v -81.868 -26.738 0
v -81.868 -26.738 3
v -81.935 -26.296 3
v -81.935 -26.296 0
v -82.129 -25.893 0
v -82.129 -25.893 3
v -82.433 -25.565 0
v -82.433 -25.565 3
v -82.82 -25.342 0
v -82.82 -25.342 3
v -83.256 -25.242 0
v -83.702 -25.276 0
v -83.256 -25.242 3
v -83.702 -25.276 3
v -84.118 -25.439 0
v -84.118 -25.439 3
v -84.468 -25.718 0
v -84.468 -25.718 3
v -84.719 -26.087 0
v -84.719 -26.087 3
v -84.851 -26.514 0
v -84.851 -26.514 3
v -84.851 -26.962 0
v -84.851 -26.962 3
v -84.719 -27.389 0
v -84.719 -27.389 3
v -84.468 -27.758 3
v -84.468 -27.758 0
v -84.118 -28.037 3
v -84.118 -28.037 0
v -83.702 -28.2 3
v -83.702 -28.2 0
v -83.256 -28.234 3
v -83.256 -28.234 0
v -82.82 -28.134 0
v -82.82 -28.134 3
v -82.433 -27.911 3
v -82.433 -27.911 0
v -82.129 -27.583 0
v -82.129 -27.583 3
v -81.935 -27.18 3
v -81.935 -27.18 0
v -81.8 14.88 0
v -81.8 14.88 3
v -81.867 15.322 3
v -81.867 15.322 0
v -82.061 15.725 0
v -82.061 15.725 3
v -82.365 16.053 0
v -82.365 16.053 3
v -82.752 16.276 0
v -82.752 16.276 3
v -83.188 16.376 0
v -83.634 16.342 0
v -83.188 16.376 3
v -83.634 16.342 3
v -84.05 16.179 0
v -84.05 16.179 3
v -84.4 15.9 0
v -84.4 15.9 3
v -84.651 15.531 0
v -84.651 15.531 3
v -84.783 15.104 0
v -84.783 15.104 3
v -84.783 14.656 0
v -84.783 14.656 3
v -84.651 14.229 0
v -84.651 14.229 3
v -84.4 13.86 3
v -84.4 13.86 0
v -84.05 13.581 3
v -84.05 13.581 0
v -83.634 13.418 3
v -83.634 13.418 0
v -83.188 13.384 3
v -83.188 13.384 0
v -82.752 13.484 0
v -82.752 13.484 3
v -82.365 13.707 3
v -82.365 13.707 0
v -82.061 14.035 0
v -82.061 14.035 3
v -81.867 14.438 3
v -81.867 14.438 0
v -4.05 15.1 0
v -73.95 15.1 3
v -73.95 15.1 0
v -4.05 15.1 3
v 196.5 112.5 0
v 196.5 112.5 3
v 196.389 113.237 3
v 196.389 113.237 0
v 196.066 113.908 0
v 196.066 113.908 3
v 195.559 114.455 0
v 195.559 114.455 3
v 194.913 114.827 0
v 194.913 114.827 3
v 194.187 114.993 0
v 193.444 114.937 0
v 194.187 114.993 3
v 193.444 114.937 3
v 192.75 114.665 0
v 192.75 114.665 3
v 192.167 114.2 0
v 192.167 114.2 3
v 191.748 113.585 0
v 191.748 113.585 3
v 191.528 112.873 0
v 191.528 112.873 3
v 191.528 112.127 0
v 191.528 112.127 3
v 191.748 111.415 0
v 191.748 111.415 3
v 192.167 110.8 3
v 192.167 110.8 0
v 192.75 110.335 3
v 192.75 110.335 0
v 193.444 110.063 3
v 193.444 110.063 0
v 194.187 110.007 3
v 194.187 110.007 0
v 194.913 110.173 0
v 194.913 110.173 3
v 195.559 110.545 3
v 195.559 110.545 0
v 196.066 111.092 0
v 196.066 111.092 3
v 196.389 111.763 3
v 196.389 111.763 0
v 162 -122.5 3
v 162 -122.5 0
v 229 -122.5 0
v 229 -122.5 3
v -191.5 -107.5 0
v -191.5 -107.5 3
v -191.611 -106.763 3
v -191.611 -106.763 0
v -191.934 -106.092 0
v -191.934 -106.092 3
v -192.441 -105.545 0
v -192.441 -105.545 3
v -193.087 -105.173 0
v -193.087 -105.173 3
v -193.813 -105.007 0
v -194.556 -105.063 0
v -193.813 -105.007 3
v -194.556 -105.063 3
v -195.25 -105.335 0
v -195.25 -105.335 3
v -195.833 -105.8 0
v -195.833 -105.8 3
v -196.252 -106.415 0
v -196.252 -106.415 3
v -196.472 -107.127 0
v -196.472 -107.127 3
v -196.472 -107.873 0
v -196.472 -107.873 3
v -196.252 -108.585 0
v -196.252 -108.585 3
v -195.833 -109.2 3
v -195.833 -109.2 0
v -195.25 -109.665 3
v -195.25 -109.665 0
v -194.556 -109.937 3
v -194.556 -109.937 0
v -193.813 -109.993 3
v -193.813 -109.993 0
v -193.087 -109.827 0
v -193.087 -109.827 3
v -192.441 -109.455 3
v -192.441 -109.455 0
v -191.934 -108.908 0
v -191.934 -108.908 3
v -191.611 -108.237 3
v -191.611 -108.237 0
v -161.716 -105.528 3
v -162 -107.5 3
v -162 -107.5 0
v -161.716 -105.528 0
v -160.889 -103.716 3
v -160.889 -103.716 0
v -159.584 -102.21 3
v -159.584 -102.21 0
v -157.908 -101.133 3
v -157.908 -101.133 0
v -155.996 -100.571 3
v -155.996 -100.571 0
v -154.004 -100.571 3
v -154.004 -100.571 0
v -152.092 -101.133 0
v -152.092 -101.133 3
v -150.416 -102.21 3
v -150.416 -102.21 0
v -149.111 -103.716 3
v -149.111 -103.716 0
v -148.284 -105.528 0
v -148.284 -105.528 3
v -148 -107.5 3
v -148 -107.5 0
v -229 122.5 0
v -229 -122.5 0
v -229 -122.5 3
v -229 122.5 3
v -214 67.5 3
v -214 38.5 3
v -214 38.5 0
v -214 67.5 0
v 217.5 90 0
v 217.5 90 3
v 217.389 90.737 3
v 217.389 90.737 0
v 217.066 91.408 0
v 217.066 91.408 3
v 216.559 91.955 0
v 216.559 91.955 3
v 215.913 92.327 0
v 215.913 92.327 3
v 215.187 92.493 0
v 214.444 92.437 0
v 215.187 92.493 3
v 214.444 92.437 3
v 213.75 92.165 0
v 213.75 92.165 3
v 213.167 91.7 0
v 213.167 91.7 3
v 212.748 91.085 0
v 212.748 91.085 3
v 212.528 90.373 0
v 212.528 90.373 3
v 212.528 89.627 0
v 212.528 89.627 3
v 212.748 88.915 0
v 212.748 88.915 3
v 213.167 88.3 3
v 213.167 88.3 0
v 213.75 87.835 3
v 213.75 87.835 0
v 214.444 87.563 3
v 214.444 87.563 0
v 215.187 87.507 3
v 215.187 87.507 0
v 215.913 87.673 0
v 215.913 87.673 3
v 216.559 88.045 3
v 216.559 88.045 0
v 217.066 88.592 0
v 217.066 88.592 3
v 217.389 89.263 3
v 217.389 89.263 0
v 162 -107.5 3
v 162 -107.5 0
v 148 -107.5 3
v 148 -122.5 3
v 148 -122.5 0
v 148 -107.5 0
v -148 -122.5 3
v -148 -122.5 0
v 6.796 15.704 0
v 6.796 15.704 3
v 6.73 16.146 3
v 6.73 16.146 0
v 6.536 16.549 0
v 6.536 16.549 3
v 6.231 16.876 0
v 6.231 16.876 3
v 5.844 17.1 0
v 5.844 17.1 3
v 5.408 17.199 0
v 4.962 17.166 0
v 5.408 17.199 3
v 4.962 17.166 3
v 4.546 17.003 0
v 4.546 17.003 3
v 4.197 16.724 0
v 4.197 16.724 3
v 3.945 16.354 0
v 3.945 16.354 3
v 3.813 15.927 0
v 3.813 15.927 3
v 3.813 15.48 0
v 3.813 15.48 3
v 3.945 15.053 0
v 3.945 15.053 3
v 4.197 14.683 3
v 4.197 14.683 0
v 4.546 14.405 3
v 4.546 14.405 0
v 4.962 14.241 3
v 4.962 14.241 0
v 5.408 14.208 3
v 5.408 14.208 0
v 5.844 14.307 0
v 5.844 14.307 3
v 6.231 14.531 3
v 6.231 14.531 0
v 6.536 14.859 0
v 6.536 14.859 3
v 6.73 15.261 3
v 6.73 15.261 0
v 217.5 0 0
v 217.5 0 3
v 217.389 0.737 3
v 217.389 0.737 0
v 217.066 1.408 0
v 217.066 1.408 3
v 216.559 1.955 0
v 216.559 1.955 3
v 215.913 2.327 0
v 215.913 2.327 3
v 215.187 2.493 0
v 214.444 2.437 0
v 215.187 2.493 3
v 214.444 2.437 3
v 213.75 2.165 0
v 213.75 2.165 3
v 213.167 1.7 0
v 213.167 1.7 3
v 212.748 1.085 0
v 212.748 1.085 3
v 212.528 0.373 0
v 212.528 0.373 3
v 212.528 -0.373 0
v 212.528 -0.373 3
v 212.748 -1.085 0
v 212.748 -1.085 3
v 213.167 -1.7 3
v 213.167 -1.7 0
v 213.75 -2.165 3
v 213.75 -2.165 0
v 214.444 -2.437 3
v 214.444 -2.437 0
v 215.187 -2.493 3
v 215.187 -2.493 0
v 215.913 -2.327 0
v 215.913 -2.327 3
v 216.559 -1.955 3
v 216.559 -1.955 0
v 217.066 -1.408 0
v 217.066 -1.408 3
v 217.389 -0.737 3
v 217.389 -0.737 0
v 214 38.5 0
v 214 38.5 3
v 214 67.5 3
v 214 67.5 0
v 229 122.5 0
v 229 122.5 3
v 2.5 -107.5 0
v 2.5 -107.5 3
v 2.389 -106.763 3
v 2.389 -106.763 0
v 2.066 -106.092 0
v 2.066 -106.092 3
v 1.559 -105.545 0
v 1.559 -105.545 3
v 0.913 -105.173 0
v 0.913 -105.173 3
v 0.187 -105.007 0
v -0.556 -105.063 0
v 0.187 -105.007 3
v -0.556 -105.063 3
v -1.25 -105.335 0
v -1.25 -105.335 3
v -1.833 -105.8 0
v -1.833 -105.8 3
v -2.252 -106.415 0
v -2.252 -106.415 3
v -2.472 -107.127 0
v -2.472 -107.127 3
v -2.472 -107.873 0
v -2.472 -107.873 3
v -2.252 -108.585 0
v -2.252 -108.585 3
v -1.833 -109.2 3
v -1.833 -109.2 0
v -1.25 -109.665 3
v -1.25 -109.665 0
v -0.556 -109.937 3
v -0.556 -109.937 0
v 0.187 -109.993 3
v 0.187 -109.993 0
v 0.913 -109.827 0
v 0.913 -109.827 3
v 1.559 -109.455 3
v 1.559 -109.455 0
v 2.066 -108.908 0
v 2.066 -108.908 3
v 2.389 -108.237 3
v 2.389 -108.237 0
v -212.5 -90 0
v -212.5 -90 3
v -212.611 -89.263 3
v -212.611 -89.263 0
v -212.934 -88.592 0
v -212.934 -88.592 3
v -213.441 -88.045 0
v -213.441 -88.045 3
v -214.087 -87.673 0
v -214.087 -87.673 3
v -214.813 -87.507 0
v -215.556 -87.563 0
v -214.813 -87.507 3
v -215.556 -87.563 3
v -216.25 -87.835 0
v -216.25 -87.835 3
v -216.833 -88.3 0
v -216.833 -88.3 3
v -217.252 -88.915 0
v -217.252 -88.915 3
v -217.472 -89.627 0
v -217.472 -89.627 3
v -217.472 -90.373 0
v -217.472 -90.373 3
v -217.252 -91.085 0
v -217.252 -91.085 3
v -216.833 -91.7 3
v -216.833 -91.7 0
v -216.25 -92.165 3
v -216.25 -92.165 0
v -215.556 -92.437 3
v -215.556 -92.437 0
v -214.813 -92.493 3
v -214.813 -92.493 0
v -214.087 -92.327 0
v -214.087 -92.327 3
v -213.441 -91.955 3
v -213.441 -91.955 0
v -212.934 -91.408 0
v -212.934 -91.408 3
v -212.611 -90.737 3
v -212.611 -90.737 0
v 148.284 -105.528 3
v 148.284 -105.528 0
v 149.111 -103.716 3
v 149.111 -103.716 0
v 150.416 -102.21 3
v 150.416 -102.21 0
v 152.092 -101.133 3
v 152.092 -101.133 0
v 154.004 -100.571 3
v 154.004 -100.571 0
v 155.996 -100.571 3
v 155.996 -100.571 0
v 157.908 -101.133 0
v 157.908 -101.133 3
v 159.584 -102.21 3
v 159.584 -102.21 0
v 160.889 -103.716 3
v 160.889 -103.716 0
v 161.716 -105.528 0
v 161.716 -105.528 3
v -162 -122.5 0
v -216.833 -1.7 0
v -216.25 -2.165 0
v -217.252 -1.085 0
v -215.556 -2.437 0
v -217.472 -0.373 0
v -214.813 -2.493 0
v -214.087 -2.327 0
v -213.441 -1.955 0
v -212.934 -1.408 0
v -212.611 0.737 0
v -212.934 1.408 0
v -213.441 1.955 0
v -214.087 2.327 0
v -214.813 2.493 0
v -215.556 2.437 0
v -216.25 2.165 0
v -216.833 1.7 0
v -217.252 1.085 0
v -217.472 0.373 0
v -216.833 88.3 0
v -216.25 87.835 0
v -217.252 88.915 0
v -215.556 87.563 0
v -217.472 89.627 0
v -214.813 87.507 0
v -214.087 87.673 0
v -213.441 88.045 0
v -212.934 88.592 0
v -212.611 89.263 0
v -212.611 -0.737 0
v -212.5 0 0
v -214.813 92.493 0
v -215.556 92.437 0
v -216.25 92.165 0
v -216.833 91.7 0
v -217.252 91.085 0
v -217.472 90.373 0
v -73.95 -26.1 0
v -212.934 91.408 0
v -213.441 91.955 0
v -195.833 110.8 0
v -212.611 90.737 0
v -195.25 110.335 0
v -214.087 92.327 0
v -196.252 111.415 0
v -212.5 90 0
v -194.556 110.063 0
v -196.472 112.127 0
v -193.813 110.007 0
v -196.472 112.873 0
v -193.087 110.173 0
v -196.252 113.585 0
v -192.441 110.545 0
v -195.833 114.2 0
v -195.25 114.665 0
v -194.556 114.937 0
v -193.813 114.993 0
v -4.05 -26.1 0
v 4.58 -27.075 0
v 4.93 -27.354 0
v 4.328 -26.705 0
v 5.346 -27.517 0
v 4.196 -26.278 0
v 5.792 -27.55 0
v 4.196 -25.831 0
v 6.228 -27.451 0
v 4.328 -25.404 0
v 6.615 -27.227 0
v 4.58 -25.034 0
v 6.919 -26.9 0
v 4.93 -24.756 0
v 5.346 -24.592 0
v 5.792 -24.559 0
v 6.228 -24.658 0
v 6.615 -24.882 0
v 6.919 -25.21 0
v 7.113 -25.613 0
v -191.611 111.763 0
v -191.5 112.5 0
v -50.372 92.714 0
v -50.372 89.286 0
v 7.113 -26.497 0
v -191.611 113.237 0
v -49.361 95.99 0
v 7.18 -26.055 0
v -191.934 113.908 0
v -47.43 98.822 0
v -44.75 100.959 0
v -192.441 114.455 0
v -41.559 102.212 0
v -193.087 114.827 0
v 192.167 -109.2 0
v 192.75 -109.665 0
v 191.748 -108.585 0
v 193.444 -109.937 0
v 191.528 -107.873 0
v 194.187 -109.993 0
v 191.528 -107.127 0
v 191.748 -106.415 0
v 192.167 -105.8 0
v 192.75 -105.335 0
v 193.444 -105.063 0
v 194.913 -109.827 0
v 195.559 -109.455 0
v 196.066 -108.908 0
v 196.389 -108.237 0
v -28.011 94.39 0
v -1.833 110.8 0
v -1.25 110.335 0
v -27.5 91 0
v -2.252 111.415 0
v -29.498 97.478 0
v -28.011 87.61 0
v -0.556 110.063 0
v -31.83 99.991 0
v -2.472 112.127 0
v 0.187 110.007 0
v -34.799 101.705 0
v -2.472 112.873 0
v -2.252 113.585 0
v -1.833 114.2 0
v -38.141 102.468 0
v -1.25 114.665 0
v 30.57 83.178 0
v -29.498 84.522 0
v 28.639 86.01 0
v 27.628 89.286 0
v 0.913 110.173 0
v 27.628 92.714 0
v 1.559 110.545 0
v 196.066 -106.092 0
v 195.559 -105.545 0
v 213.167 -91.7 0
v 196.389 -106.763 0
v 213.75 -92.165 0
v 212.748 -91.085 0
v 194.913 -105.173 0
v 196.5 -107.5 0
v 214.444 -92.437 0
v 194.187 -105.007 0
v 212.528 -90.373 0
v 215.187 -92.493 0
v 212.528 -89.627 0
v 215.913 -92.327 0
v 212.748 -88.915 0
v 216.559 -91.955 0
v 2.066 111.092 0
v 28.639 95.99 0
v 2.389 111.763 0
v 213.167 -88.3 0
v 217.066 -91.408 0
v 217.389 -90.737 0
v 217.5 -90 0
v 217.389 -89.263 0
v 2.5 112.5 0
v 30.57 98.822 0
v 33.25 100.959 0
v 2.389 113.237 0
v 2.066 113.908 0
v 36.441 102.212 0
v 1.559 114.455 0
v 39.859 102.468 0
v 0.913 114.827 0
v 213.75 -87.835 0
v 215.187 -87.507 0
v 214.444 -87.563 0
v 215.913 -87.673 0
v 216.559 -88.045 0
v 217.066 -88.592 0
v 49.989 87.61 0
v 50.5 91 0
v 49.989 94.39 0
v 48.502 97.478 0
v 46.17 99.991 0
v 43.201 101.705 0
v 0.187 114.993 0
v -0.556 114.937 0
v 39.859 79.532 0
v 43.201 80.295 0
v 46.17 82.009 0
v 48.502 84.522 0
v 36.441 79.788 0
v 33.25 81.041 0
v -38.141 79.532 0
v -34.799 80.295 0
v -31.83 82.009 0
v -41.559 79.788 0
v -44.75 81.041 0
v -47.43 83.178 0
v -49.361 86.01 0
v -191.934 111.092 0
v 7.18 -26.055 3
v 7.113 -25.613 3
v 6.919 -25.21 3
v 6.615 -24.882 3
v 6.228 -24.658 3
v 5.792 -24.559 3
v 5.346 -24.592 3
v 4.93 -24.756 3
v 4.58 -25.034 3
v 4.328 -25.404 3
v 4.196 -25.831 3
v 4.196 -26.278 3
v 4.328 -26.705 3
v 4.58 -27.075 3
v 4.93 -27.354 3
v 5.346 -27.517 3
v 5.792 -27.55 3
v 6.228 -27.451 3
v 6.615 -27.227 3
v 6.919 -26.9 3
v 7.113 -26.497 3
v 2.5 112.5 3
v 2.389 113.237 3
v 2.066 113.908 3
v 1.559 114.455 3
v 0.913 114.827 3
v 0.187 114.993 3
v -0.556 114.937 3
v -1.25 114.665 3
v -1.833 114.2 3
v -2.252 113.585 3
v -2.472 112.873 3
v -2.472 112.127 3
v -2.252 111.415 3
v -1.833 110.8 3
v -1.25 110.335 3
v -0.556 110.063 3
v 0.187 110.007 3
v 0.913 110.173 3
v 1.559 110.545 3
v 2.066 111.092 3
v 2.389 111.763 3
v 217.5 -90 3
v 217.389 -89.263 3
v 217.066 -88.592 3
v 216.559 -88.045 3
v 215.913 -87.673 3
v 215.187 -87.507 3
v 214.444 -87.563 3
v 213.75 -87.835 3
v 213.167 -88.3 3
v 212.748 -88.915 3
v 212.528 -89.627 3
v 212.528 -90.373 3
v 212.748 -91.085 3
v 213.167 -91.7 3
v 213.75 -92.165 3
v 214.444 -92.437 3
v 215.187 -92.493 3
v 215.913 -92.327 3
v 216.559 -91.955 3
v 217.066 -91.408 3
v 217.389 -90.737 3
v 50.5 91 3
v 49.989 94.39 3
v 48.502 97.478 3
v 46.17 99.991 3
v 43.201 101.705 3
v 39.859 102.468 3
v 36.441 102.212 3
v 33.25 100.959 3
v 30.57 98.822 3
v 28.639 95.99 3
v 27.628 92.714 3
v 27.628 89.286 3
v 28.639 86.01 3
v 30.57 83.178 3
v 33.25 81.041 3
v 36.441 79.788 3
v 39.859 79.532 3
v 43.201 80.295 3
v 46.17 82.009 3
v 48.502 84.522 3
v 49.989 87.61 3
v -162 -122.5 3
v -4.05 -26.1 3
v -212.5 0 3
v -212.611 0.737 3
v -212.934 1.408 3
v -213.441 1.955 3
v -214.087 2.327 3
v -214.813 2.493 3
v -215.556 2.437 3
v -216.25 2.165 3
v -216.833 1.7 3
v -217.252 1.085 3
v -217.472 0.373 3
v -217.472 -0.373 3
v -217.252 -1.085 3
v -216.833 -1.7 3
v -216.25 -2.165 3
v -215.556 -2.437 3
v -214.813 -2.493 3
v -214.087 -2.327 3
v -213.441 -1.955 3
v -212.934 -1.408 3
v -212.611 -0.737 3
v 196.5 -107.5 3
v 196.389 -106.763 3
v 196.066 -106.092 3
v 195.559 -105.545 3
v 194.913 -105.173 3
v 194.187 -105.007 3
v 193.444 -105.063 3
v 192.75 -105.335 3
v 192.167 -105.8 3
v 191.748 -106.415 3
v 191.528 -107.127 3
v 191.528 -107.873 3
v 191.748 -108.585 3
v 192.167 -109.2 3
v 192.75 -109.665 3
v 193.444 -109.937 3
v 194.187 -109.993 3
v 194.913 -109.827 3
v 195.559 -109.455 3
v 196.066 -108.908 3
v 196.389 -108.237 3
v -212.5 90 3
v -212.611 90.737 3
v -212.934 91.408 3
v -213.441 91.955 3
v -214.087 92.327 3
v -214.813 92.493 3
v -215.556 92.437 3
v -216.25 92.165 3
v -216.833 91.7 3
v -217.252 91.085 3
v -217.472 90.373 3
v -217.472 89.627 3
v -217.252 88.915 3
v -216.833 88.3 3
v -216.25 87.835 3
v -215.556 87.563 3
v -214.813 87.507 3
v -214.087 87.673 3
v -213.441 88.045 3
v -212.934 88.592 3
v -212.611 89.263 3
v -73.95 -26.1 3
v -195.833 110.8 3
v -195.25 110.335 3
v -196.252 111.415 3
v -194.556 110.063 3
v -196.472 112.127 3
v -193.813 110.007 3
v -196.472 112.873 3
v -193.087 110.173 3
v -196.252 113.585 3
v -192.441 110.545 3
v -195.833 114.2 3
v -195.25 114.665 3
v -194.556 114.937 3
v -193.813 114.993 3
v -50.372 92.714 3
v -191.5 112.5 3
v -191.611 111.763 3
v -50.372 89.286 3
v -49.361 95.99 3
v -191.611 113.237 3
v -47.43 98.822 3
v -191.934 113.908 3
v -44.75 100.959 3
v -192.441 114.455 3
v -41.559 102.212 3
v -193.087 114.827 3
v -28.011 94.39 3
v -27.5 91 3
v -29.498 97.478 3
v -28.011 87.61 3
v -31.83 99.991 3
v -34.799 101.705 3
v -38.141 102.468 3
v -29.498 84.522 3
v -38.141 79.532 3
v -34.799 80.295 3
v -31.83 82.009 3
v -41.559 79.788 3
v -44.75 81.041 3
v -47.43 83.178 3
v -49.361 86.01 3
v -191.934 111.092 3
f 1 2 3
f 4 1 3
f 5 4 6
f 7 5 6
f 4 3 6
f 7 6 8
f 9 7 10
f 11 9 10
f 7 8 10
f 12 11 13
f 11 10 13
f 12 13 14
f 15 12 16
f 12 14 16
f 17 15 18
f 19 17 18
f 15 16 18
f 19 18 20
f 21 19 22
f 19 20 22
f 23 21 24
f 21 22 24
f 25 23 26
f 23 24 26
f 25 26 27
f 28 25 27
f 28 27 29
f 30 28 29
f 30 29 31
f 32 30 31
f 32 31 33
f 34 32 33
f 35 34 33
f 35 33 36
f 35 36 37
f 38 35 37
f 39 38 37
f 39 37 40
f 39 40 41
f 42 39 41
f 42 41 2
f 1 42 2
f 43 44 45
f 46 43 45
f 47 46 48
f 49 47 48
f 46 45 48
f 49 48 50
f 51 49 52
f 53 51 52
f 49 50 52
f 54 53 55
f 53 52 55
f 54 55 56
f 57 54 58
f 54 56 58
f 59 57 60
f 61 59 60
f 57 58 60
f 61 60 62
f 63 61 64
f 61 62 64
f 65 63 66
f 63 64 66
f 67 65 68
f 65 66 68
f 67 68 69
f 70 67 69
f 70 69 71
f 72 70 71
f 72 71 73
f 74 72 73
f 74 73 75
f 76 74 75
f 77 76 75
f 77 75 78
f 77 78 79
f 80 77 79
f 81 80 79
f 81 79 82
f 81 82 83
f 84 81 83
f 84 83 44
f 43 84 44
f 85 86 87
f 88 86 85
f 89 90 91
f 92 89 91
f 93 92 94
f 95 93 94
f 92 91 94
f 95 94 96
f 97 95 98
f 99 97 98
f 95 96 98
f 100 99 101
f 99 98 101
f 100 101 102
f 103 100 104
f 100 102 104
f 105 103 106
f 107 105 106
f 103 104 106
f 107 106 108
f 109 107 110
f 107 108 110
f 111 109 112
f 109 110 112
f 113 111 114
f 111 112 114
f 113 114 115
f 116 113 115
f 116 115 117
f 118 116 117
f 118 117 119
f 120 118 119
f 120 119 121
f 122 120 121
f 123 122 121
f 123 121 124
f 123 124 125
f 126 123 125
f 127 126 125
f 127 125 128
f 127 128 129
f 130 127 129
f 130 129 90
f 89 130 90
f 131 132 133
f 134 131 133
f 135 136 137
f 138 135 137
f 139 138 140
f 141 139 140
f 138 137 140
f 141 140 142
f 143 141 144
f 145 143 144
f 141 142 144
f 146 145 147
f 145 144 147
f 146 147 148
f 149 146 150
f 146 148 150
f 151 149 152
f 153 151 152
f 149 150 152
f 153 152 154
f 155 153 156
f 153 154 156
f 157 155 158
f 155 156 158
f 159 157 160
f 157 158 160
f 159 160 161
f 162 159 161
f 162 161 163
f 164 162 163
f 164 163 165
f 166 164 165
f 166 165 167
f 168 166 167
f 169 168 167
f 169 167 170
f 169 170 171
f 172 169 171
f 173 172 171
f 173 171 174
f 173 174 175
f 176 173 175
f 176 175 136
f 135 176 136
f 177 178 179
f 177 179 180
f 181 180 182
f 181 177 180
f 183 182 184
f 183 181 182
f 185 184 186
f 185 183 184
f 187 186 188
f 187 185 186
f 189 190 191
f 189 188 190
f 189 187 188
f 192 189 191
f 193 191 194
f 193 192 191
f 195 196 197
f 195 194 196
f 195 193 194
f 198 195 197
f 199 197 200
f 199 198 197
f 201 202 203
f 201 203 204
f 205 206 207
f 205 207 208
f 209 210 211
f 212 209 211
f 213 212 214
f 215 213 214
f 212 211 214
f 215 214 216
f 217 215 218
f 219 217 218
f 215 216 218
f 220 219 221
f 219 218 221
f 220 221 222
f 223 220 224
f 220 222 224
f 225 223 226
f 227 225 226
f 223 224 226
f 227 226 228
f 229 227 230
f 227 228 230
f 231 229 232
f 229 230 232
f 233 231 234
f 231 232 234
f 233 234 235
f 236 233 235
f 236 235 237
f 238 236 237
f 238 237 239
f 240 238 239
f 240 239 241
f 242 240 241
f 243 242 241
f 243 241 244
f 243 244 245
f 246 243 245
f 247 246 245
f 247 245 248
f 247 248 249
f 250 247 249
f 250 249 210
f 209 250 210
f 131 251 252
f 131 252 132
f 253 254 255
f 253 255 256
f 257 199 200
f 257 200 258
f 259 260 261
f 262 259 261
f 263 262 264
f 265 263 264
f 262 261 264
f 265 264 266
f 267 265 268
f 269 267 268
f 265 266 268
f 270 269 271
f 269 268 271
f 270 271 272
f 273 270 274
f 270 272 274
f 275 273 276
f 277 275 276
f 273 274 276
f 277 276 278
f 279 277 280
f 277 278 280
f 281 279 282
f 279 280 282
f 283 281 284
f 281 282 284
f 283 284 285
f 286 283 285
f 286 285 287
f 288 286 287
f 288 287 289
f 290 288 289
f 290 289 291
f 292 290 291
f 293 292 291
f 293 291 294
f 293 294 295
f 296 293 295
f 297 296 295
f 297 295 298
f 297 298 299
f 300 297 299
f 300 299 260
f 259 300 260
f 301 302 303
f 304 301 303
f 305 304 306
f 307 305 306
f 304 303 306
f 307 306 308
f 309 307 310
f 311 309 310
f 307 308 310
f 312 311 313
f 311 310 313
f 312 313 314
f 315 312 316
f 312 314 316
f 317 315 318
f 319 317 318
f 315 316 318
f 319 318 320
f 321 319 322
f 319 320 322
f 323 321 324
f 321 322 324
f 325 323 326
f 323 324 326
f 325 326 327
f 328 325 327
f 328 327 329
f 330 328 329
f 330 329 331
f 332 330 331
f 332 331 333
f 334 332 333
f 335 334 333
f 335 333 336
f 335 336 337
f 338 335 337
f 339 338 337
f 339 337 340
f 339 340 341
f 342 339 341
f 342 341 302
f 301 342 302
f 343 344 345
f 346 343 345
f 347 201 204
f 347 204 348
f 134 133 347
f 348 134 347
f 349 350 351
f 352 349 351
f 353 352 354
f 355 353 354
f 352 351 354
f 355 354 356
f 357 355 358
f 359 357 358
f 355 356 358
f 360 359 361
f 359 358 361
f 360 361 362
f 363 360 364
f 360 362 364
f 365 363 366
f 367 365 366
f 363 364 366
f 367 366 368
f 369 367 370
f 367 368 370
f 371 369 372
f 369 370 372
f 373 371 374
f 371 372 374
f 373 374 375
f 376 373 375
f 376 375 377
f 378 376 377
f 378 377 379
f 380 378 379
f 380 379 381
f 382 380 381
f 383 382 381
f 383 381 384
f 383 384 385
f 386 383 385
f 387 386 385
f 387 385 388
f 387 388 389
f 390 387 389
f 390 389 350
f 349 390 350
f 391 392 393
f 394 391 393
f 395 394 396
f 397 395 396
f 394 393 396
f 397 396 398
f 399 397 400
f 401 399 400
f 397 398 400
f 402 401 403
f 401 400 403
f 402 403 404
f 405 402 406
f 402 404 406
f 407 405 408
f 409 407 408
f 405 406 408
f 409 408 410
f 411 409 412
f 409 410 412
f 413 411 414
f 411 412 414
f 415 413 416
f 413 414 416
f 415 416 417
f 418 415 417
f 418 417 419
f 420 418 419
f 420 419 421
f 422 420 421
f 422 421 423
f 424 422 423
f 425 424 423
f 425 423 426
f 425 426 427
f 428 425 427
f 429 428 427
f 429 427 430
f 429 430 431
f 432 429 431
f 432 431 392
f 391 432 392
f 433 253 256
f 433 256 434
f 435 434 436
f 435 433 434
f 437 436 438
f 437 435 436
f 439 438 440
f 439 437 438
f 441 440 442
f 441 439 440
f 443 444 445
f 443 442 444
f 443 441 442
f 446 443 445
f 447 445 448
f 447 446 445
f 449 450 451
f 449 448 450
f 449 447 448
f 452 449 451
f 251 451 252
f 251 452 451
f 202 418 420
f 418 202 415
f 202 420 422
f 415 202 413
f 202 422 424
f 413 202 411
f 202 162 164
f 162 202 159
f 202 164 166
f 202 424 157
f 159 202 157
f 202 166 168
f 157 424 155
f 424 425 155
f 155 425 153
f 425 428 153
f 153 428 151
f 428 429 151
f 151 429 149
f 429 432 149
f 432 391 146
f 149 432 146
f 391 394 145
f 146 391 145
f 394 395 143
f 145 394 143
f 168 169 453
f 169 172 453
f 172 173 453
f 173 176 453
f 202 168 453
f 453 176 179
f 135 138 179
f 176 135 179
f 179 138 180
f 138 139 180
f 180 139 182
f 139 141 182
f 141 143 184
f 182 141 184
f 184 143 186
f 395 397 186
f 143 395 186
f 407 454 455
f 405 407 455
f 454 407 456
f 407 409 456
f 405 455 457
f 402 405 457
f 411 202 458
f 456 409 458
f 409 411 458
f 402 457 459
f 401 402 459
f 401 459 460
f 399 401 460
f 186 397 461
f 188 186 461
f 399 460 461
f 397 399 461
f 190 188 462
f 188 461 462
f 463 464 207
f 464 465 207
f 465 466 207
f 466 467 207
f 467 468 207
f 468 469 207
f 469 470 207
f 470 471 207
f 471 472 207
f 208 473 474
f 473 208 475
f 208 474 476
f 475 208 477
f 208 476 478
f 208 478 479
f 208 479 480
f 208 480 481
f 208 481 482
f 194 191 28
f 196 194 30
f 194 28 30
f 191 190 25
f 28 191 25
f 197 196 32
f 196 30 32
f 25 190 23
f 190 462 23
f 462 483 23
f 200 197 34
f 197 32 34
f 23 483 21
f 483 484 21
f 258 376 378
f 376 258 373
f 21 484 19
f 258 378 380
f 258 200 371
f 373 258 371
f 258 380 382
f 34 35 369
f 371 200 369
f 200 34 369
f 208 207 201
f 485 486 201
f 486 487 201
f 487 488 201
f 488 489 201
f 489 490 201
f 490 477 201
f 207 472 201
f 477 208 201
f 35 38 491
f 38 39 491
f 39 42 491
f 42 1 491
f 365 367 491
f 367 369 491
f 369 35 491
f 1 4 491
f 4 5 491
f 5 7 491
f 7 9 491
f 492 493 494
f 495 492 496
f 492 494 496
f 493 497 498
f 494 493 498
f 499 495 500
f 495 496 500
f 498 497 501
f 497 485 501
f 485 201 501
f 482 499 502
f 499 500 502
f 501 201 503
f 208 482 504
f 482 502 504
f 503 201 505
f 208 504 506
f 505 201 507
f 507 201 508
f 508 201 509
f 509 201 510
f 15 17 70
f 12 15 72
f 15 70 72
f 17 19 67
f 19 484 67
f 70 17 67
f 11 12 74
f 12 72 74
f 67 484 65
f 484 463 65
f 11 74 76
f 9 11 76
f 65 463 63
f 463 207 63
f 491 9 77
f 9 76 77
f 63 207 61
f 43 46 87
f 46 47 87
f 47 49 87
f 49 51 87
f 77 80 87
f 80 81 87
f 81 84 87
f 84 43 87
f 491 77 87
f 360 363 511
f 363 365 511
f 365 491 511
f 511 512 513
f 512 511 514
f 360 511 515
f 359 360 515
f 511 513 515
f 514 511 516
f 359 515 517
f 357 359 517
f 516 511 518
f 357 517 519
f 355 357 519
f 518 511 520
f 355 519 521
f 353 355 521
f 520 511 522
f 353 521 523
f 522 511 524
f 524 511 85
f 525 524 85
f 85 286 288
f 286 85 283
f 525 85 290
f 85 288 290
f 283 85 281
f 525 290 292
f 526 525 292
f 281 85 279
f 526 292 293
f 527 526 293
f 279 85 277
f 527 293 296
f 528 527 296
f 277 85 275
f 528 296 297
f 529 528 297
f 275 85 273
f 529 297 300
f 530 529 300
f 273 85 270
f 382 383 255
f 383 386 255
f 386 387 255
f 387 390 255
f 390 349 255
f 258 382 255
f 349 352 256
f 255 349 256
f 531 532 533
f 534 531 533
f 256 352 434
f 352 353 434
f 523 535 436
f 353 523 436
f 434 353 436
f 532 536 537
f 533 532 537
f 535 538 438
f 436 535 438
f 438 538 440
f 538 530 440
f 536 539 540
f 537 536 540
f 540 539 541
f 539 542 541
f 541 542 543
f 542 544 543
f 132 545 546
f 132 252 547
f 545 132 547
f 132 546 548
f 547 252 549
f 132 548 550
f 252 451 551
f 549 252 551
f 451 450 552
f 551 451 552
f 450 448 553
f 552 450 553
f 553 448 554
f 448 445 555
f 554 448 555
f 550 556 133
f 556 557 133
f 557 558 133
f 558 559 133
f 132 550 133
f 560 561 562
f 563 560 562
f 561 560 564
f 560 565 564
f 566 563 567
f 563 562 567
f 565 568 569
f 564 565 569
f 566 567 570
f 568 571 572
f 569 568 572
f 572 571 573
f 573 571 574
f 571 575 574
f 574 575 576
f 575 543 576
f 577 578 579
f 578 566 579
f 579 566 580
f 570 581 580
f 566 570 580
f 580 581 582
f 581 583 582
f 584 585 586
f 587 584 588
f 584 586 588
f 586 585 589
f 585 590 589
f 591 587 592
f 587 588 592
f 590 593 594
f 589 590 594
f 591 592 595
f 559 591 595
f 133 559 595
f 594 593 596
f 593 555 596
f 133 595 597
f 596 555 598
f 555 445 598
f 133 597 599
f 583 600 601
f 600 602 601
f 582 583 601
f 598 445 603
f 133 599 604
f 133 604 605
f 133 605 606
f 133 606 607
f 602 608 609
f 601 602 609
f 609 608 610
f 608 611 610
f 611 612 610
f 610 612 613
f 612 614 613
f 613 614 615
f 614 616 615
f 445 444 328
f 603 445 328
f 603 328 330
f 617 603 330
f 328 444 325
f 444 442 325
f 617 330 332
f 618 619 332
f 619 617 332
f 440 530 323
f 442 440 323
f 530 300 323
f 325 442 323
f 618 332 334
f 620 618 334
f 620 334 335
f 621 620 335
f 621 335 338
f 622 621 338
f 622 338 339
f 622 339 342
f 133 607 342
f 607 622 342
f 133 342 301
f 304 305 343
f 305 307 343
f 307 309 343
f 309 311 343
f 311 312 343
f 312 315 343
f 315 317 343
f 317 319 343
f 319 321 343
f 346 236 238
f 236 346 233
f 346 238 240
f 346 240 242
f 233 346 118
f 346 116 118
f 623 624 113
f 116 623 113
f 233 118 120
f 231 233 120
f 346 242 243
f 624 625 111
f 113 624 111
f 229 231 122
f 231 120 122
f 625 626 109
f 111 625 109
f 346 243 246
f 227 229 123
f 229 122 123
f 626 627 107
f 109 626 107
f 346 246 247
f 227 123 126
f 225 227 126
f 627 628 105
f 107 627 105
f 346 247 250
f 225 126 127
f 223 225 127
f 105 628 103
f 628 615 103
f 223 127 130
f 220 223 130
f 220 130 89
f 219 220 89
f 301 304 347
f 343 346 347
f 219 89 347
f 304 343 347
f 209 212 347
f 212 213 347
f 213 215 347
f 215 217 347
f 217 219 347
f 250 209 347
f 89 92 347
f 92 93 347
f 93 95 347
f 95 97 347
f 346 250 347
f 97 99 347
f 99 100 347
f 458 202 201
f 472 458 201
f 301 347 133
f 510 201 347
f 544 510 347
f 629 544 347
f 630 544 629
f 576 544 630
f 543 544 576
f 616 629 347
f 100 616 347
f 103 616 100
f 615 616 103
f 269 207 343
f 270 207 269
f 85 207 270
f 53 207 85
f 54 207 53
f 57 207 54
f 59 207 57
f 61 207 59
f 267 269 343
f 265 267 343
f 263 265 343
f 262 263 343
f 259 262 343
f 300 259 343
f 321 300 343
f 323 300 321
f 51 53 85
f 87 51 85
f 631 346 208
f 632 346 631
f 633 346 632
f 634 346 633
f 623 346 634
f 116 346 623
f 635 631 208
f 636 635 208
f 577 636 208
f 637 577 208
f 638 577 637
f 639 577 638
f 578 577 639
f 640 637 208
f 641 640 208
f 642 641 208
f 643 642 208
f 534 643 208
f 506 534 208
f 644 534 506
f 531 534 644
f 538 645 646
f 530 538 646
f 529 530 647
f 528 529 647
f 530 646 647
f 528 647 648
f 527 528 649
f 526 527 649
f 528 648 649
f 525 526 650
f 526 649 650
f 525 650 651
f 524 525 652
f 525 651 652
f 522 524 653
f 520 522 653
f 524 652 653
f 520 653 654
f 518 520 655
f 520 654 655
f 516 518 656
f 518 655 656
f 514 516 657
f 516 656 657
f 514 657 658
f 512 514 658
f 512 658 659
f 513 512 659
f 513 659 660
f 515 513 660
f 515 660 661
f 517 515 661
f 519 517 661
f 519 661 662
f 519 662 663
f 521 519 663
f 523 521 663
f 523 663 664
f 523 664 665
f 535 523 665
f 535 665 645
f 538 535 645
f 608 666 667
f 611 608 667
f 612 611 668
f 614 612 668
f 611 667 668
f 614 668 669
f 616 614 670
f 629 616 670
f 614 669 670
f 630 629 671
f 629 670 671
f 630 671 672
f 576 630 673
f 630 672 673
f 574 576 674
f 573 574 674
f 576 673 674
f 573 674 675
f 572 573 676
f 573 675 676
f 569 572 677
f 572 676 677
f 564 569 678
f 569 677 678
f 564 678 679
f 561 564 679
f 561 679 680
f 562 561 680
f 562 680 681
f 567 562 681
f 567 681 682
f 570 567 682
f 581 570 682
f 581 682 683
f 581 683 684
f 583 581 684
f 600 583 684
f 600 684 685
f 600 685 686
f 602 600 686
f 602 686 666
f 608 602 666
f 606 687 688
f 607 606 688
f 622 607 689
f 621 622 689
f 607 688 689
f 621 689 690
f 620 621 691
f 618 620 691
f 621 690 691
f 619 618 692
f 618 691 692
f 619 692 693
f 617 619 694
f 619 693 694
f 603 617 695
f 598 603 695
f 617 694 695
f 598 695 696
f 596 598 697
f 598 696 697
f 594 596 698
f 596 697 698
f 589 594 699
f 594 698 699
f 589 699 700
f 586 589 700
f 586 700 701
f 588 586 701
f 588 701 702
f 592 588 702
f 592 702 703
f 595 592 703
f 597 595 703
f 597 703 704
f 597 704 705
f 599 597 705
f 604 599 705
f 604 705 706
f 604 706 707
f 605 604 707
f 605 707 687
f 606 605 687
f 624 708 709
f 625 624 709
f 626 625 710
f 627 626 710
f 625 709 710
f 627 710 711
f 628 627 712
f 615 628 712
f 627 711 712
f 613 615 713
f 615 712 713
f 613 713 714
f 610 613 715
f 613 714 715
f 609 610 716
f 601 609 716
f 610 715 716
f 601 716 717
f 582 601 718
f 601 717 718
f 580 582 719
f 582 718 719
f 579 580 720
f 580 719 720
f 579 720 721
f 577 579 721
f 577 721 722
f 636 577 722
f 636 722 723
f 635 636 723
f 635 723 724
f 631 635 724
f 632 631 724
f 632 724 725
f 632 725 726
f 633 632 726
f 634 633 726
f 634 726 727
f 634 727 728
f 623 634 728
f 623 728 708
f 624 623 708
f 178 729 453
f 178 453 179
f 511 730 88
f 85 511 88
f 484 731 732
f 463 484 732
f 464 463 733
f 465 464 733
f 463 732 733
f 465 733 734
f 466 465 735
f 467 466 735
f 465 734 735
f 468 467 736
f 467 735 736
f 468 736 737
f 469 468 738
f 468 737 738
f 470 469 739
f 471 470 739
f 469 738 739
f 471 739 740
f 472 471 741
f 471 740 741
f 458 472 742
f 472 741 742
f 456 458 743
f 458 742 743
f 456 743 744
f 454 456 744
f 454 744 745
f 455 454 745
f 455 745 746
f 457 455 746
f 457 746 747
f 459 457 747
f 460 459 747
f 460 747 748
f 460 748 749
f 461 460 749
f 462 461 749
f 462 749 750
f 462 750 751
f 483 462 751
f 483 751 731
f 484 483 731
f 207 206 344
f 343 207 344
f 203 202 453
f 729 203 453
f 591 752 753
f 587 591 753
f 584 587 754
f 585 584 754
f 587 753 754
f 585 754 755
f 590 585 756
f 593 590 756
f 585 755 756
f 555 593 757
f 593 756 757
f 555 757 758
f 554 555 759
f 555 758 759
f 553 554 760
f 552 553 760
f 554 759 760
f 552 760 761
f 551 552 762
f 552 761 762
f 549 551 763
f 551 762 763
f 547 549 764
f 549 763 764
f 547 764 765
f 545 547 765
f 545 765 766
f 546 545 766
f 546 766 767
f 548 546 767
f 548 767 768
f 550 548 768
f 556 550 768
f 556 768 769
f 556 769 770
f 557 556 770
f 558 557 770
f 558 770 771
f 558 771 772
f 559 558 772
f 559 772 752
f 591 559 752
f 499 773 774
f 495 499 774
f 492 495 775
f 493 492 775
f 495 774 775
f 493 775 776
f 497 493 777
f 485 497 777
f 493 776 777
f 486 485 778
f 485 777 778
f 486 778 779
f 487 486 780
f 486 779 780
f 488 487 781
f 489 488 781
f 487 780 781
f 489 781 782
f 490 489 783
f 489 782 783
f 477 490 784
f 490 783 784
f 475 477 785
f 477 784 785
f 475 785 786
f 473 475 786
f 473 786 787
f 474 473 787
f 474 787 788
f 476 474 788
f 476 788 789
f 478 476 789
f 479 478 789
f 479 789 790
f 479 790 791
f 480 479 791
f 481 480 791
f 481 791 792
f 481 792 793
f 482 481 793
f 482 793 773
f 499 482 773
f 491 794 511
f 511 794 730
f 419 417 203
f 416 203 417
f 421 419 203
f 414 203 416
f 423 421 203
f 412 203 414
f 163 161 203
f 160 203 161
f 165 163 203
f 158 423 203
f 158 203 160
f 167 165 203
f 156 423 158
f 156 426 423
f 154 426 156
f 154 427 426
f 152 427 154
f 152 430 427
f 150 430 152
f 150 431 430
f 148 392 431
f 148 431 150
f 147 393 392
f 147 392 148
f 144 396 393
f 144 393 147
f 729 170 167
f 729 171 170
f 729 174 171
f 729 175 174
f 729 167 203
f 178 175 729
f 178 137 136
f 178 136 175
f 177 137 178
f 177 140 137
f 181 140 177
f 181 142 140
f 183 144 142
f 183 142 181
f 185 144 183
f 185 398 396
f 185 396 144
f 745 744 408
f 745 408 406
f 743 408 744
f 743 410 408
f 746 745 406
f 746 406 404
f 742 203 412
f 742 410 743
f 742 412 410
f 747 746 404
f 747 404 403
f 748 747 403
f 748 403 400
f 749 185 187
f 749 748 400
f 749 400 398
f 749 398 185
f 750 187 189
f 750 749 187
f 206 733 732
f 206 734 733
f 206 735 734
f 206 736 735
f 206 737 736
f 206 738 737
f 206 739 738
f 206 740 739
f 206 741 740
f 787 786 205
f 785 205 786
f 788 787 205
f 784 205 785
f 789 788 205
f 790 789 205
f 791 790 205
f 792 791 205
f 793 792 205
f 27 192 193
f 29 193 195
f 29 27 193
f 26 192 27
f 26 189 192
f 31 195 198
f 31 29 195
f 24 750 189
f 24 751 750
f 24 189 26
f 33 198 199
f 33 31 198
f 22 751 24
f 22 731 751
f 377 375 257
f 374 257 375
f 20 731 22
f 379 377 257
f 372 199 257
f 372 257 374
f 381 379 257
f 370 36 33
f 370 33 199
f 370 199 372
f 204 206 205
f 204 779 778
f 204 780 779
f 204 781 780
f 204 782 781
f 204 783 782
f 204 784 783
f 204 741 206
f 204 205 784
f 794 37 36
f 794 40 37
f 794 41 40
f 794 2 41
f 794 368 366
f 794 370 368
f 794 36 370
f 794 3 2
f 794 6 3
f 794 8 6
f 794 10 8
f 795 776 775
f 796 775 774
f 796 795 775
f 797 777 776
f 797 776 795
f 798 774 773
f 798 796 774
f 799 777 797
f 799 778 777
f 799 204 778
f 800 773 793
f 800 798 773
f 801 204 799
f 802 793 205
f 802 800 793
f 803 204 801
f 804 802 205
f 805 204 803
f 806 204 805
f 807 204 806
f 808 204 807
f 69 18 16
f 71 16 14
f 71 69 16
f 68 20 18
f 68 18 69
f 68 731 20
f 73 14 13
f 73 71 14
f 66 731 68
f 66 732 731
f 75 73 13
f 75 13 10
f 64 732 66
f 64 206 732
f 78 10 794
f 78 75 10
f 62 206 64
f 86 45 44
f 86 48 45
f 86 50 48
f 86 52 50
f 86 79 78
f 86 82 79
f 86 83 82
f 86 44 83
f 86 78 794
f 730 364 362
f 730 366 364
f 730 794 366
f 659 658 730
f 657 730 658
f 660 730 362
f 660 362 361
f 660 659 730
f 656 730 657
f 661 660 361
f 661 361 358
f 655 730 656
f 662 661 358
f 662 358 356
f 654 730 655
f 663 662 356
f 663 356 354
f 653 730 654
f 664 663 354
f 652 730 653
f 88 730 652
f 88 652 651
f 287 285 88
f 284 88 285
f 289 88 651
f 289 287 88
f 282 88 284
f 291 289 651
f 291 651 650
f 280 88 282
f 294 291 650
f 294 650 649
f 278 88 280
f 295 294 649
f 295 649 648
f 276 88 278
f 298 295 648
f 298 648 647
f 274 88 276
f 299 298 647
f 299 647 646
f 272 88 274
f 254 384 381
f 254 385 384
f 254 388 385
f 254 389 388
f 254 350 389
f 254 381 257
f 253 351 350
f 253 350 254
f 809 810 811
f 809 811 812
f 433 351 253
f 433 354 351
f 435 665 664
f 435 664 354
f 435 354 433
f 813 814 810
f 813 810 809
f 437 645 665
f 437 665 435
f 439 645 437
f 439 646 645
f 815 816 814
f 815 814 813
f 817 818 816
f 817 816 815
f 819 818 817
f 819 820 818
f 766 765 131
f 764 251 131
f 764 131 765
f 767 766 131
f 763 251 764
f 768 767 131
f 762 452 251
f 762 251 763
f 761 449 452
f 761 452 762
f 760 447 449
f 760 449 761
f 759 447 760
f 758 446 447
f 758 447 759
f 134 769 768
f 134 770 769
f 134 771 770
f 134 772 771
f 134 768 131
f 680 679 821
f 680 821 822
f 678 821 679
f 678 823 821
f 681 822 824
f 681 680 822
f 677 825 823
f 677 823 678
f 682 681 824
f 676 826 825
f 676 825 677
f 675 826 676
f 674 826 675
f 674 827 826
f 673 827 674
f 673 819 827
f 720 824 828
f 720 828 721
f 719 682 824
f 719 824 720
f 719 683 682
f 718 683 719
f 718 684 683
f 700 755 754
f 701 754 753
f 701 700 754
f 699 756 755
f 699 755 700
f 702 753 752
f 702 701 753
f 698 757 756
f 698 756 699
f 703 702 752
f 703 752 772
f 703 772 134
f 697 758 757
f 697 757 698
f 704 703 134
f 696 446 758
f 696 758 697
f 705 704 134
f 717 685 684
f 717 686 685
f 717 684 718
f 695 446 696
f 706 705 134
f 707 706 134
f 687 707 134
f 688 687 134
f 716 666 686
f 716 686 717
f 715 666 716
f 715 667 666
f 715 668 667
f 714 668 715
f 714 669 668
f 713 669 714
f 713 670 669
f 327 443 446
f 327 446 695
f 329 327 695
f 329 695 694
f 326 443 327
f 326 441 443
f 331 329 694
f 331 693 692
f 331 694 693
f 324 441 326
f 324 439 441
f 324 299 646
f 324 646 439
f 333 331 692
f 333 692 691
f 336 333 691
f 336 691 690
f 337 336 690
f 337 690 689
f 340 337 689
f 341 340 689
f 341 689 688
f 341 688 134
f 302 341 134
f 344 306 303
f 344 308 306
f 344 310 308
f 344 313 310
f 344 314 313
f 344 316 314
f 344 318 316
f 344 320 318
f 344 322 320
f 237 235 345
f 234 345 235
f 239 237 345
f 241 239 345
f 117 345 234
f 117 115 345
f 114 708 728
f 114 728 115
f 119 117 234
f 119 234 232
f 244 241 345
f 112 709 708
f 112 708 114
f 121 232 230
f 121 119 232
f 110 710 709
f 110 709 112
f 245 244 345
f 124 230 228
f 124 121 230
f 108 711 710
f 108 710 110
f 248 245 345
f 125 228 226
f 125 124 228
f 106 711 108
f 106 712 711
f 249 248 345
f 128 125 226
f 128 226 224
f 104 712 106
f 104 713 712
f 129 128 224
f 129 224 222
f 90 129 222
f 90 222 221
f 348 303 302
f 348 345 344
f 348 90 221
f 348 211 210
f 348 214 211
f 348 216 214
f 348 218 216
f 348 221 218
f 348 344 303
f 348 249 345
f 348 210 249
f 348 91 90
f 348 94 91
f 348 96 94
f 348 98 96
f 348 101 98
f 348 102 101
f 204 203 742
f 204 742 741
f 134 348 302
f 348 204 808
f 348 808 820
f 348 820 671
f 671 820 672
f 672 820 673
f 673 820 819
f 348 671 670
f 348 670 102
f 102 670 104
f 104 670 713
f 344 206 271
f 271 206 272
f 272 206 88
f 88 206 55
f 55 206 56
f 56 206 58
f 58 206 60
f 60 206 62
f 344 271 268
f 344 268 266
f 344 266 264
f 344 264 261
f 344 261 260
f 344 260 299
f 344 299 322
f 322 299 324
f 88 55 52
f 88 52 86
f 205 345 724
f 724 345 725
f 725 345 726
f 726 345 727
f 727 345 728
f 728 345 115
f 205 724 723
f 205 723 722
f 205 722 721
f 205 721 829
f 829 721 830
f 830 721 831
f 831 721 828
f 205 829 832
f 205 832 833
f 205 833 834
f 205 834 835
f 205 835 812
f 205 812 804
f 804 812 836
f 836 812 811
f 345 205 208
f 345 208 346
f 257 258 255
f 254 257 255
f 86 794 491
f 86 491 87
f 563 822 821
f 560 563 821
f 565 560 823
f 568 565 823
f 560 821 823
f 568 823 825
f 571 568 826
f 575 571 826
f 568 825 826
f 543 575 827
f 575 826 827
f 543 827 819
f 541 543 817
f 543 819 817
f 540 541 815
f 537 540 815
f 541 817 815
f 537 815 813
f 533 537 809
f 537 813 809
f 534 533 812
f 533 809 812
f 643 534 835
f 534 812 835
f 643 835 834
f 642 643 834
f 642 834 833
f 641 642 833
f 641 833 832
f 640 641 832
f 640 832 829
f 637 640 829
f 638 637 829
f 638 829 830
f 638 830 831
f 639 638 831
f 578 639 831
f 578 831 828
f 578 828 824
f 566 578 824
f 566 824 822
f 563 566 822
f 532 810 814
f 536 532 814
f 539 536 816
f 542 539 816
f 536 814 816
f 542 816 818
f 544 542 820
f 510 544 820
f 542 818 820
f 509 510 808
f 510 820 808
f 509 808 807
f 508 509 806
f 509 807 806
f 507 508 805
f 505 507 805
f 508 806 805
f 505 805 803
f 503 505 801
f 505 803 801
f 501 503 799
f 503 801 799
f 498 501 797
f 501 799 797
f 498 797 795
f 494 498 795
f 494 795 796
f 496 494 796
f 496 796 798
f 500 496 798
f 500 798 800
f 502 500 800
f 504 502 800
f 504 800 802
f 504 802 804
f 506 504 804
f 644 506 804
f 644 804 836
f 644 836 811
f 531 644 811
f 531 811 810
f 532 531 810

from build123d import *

# Parameters (mm, degrees)
SKETCH1_W           = 458
SKETCH1_H           = 245
BOSS_EXTRUDE1_DEPTH = 3
CUT_EXTRUDE1_DEPTH  = 260.723410574
SKETCH3_R           = 2.5
CUT_EXTRUDE2_DEPTH  = 260.723410574
SKETCH4_R           = 11.5
CUT_EXTRUDE3_DEPTH  = 260.723410574
SKETCH5_W           = 428
SKETCH5_H           = 29
CUT_EXTRUDE4_DEPTH  = 260.723410574
SKETCH8_R           = 1.5
SKETCH8_W           = 69.9
SKETCH8_H           = 41.2
CUT_EXTRUDE5_DEPTH  = 260.723410574


with BuildPart() as part:
    # Sketch1 → Boss-Extrude1 (new body)
    with BuildSketch(Plane.XY):
        Rectangle(SKETCH1_W, SKETCH1_H)
    extrude(amount=BOSS_EXTRUDE1_DEPTH)

    # Sketch2 → Cut-Extrude1 (cut, through all)
    with BuildSketch(Plane.XY.offset(3)):
        with BuildLine():
            Line((-148, -107.5), (-148, -122.5))
            ThreePointArc((-148, -122.5), (-155, -129.5), (-162, -122.5))
            Line((-162, -122.5), (-162, -107.5))
            ThreePointArc((-162, -107.5), (-155, -100.5), (-148, -107.5))
        make_face()
        with BuildLine():
            Line((162, -107.5), (162, -122.5))
            ThreePointArc((162, -122.5), (155, -129.5), (148, -122.5))
            Line((148, -122.5), (148, -107.5))
            ThreePointArc((148, -107.5), (155, -100.5), (162, -107.5))
        make_face()
    extrude(amount=-CUT_EXTRUDE1_DEPTH, mode=Mode.SUBTRACT)

    # Sketch3 → Cut-Extrude2 (cut, through all)
    with BuildSketch(Plane.XY.offset(3)):
        with Locations((-194, 112.5)):
            Circle(SKETCH3_R)
        with Locations((-194, -107.5)):
            Circle(SKETCH3_R)
        with Locations((194, -107.5)):
            Circle(SKETCH3_R)
        with Locations((194, 112.5)):
            Circle(SKETCH3_R)
        with Locations((-215, 0)):
            Circle(SKETCH3_R)
        with Locations((-215, -90)):
            Circle(SKETCH3_R)
        with Locations((-215, 90)):
            Circle(SKETCH3_R)
        with Locations((215, 0)):
            Circle(SKETCH3_R)
        with Locations((215, -90)):
            Circle(SKETCH3_R)
        with Locations((215, 90)):
            Circle(SKETCH3_R)
        with Locations((0, 112.5)):
            Circle(SKETCH3_R)
        with Locations((0, -107.5)):
            Circle(SKETCH3_R)
    extrude(amount=-CUT_EXTRUDE2_DEPTH, mode=Mode.SUBTRACT)

    # Sketch4 → Cut-Extrude3 (cut, through all)
    with BuildSketch(Plane.XY.offset(3)):
        with Locations((-39, 91)):
            Circle(SKETCH4_R)
        with Locations((39, 91)):
            Circle(SKETCH4_R)
    extrude(amount=-CUT_EXTRUDE3_DEPTH, mode=Mode.SUBTRACT)

    # Sketch5 → Cut-Extrude4 (cut, through all)
    with BuildSketch(Plane.XY.offset(3)):
        with Locations((0, 53)):
            Rectangle(SKETCH5_W, SKETCH5_H)
    extrude(amount=-CUT_EXTRUDE4_DEPTH, mode=Mode.SUBTRACT)

    # Sketch8 → Cut-Extrude5 (cut, through all)
    with BuildSketch(Plane.XY.offset(3)):
        with Locations((5.296172264, 15.703565509)):
            Circle(SKETCH8_R)
        with Locations((5.679687501, -26.054673392)):
            Circle(SKETCH8_R)
        with Locations((-83.3, 14.88)):
            Circle(SKETCH8_R)
        with Locations((-83.367997673, -26.737946691)):
            Circle(SKETCH8_R)
        with Locations((-39, -5.5)):
            Rectangle(SKETCH8_W, SKETCH8_H)
    extrude(amount=-CUT_EXTRUDE5_DEPTH, mode=Mode.SUBTRACT)


solid = part.part
